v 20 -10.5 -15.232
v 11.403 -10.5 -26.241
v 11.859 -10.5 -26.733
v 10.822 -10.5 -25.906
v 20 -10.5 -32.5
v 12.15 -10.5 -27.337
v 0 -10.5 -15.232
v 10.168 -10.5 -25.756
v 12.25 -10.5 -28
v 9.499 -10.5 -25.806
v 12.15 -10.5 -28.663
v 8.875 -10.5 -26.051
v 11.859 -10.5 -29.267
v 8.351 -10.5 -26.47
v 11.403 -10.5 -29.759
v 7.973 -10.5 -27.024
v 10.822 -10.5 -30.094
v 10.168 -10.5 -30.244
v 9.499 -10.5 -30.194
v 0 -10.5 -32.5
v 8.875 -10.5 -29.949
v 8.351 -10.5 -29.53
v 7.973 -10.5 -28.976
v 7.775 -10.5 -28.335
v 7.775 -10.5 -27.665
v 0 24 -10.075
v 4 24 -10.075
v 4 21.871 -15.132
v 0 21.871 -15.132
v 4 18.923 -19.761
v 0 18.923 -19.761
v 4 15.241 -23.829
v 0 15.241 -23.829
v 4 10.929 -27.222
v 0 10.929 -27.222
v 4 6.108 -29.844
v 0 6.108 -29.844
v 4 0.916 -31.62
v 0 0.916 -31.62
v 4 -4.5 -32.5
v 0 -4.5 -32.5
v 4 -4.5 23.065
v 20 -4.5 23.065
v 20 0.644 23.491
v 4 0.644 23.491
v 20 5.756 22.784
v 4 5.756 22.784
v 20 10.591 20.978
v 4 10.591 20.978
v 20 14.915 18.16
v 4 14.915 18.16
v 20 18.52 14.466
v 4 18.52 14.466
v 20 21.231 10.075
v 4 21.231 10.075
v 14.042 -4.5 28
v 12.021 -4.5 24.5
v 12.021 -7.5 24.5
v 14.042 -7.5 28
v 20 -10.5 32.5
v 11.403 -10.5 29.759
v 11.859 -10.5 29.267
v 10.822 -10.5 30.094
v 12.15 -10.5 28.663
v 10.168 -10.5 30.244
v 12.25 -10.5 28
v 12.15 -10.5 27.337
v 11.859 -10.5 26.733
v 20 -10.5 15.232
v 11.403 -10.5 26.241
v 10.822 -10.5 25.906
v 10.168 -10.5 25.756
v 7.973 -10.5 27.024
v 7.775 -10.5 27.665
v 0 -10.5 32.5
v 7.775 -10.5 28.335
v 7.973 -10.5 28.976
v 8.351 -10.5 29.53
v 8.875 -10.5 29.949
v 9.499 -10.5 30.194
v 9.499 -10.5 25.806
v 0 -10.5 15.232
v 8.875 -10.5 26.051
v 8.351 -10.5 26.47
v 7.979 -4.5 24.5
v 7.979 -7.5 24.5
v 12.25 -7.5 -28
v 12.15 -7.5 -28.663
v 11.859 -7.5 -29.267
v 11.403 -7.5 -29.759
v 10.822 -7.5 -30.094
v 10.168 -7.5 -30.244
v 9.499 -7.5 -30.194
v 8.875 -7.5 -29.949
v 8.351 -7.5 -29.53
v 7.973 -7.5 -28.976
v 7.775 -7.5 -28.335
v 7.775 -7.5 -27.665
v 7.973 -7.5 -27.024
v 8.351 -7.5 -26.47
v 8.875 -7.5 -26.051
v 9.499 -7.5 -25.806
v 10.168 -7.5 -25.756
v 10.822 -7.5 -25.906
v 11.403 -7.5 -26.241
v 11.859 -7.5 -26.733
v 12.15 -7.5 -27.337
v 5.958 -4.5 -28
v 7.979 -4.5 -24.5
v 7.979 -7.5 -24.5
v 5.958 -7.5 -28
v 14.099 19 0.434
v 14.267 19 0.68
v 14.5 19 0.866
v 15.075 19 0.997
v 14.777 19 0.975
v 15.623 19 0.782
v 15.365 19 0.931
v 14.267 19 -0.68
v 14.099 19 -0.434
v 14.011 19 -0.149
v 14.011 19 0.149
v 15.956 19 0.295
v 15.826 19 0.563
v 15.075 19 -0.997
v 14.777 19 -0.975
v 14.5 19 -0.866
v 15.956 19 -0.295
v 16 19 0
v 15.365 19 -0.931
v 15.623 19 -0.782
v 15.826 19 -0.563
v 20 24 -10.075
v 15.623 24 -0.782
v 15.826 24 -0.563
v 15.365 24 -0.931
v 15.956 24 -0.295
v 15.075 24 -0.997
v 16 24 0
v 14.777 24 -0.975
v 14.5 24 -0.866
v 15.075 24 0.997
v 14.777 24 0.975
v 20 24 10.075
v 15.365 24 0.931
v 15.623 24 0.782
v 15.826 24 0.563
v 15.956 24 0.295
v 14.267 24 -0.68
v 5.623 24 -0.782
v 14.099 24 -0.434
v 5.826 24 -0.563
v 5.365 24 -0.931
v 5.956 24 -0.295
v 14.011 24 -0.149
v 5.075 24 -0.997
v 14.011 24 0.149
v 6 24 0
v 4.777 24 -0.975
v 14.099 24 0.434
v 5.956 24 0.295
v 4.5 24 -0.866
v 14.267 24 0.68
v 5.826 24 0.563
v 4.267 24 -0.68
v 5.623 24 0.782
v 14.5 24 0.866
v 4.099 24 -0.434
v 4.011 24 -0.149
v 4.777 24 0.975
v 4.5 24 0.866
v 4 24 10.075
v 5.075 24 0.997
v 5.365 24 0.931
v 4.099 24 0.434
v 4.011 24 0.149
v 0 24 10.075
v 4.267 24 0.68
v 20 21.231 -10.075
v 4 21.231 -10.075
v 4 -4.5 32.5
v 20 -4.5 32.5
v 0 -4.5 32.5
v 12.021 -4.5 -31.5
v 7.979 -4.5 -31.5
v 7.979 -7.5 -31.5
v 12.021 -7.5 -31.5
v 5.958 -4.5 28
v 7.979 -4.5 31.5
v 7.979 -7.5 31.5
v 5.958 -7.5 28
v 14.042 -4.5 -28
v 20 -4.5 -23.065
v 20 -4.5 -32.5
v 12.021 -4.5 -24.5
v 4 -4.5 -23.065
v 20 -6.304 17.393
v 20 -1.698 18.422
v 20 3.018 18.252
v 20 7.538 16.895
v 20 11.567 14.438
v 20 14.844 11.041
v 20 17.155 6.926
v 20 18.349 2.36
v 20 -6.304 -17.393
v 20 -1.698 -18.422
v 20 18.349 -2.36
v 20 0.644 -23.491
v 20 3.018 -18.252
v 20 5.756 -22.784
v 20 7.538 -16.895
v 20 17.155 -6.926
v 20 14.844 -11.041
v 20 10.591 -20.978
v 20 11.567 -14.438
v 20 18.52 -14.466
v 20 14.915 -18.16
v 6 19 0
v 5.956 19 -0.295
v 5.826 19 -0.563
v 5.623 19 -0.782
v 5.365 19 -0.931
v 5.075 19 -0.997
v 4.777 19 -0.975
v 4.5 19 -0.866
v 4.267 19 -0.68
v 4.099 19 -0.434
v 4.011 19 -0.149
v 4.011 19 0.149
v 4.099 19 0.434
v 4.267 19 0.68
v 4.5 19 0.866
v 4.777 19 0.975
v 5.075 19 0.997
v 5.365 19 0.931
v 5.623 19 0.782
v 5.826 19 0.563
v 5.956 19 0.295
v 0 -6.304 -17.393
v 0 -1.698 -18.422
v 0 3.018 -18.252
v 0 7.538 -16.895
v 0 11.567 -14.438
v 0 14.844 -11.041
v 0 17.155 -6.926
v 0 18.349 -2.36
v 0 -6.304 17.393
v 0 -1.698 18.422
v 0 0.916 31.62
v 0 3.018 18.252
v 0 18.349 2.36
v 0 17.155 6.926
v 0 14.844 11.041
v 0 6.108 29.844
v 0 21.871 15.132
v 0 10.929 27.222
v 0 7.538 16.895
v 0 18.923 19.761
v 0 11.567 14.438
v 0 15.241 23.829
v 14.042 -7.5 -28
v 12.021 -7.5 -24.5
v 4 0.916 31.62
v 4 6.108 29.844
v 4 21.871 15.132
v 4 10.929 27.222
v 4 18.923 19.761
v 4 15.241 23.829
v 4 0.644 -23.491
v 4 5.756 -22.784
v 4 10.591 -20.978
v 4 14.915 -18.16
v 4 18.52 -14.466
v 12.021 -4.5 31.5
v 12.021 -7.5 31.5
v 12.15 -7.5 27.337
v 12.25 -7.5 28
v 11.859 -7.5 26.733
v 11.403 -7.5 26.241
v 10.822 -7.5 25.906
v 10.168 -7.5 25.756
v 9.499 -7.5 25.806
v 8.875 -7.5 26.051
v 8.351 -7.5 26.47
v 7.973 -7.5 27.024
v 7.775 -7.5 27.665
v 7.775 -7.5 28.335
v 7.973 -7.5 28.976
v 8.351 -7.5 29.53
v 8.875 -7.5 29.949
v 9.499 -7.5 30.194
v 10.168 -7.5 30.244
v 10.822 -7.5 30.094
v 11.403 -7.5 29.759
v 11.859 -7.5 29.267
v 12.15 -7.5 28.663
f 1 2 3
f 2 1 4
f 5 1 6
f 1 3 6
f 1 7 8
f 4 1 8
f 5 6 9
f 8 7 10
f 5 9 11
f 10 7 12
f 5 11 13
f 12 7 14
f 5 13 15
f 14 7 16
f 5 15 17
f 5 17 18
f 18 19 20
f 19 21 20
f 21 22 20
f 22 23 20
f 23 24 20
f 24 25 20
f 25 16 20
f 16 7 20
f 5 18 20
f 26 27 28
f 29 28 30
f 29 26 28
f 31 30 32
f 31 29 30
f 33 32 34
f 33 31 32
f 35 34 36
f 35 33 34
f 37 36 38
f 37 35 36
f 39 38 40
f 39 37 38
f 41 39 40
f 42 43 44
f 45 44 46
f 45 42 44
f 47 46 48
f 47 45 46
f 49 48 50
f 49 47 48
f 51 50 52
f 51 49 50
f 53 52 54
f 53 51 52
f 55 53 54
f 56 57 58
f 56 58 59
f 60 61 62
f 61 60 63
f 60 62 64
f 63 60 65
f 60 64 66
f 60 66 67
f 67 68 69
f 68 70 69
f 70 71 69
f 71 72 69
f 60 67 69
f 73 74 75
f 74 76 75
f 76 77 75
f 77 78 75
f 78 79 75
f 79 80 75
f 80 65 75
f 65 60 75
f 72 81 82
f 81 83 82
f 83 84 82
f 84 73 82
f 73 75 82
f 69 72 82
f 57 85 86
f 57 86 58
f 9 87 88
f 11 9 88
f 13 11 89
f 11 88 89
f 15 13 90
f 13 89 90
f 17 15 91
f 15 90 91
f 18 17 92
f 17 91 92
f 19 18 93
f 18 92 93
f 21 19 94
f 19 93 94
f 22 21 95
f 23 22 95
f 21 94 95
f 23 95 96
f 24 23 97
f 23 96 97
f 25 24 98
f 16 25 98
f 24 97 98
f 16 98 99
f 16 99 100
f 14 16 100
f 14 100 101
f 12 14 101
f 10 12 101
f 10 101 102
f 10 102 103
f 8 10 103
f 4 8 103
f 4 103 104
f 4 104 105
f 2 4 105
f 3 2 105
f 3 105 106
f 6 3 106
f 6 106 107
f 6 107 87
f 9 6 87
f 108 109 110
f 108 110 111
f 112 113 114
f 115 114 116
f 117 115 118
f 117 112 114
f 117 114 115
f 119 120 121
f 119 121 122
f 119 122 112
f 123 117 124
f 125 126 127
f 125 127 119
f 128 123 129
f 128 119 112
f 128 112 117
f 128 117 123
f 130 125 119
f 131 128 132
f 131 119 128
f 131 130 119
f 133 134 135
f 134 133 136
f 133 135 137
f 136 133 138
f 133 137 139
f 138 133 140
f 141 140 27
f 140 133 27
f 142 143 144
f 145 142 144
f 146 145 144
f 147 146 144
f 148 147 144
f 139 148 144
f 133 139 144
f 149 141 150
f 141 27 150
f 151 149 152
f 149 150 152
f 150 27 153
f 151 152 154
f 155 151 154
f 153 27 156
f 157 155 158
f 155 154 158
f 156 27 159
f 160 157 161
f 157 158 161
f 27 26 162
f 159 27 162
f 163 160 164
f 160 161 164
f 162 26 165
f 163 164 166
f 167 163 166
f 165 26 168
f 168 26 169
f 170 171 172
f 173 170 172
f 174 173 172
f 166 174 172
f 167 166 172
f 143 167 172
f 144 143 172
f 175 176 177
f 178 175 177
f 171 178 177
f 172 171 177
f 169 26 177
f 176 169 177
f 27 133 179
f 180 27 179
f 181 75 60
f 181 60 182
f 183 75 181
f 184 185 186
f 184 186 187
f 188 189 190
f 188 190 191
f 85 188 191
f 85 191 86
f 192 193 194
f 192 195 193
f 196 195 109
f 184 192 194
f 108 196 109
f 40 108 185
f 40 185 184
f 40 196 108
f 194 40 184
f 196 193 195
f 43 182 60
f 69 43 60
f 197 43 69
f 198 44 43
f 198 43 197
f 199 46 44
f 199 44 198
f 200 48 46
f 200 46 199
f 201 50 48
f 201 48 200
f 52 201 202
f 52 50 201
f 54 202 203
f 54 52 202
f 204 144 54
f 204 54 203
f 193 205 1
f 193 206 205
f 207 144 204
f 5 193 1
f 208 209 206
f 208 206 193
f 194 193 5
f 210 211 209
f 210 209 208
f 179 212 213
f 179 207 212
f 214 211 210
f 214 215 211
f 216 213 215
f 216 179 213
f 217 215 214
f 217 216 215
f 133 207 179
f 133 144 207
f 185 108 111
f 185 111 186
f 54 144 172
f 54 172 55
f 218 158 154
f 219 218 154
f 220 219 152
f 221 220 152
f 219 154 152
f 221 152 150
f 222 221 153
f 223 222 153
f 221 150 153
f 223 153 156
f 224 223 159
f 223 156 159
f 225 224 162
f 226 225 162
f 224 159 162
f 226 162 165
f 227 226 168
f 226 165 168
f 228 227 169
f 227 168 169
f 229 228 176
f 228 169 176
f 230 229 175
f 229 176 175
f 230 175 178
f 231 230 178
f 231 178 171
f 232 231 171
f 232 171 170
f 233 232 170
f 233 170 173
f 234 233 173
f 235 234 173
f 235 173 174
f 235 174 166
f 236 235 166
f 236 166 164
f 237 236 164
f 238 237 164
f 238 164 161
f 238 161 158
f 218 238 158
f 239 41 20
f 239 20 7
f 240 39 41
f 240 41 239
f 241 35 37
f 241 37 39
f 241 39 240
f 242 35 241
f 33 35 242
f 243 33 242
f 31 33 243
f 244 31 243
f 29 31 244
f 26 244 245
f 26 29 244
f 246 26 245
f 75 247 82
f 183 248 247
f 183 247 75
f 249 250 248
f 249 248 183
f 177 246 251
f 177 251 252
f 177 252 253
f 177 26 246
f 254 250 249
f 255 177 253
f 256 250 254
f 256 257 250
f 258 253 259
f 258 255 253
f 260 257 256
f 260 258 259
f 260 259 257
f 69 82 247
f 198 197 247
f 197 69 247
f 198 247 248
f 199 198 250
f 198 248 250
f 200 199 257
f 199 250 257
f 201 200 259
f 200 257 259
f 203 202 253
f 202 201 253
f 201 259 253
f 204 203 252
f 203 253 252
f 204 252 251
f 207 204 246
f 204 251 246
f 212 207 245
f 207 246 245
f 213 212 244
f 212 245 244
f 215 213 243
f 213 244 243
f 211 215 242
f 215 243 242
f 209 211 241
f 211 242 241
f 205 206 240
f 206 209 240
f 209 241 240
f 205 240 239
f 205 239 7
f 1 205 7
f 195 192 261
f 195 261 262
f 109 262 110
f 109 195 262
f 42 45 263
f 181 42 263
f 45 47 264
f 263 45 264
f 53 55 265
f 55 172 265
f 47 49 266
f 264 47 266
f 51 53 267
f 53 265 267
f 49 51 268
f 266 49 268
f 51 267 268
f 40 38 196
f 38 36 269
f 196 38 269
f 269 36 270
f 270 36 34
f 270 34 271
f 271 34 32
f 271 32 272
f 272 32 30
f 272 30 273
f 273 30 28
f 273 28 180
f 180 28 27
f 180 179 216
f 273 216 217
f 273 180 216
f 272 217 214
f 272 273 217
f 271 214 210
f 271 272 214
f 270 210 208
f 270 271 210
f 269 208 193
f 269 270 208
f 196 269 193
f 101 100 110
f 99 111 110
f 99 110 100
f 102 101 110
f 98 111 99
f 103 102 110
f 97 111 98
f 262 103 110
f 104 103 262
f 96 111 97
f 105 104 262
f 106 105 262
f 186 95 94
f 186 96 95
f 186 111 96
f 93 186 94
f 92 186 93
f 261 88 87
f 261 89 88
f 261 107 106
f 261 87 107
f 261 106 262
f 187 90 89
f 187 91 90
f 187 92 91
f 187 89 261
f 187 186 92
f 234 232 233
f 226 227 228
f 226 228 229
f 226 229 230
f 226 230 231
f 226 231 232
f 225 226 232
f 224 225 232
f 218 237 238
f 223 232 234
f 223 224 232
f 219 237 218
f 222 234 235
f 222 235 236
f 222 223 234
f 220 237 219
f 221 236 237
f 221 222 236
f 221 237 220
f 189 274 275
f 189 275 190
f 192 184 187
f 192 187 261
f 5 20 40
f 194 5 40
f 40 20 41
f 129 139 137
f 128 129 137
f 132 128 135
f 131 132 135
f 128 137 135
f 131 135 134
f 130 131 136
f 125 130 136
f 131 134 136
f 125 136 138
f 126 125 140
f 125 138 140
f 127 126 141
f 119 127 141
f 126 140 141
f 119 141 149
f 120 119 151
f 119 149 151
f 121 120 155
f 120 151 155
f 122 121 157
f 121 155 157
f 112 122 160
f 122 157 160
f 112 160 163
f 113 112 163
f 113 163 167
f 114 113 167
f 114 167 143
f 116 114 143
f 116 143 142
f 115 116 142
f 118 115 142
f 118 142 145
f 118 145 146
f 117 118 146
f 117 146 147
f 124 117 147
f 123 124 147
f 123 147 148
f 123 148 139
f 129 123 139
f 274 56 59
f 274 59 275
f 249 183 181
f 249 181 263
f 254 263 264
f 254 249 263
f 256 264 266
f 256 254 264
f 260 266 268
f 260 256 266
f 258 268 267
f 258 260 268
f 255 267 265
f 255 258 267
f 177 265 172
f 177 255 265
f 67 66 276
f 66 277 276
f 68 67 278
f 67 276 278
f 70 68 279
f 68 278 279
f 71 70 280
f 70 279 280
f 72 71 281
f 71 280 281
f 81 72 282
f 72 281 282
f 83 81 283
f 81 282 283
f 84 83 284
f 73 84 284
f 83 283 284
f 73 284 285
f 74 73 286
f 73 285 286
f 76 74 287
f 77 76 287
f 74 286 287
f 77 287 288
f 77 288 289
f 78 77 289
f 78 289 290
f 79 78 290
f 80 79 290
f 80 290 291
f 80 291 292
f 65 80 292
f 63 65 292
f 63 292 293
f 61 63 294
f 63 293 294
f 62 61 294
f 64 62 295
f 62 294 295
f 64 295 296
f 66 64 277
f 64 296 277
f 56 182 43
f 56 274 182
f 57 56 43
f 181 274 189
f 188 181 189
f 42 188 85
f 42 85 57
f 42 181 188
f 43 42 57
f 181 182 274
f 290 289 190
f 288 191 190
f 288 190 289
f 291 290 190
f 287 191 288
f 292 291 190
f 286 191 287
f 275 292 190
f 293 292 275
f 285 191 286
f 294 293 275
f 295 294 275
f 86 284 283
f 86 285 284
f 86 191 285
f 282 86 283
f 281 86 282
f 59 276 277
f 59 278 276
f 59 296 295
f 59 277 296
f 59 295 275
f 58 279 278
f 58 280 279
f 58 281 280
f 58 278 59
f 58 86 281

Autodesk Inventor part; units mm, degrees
ref_plane "YZ Plane" through (0, 0, 0) normal (1, 0, 0) x (0, 1, 0)
ref_plane "XZ Plane" through (0, 0, 0) normal (0, 1, 0) x (-1, 0, 0)
ref_plane "XY Plane" through (0, 0, 0) normal (0, 0, 1) x (1, 0, 0)
sketch "Эскиз1" plane through (0, 0, 0) normal (1, 0, 0) x (0, 1, 0)
  arc A0 (-10.5, -15.2315) -> (-10.5, 15.2315) centre (0, 0) ccw
  line L0 (-18.5, 7.8305) -> (-18.5, -11.8621) construction
  line L1 (-22.5, 35.5109) -> (-22.5, -35.1928) construction
  line L2 (-10.5, 32.5) -> (-10.5, 15.2315)
  line L3 (-4.5, 32.5) -> (-4.5, 23.0651)
  line L4 (-10.5, 32.5) -> (-4.5, 32.5)
  line L5 (-10.5, -32.5) -> (-4.5, -32.5)
  line L6 (0, 0) -> (-8, 0) construction
  arc A1 (-4.5, -23.0651) -> (-4.5, 23.0651) centre (0, 0) ccw
  line L7 (-10.5, -15.2315) -> (-10.5, -32.5)
  line L8 (-4.5, -23.0651) -> (-4.5, -32.5)
  dimension "d0" = 37
  dimension "d2" = 4
  dimension "d3" = 12
  dimension "d4" = 6
  dimension "d5" = 65
  dimension "d6" = 5
extrude "Выдавливание1" add sketch "Эскиз1" along normal blind 20
sketch "Эскиз2" plane through (0, -4.5, 32.5) normal (0, 1, 0) x (1, 0, 0)
  line L0 (10, -4.2749) -> (10, 72.1744) construction
  line L1 (7.9793, 1) -> (5.9585, 4.5)
  line L2 (5.9585, 4.5) -> (7.9793, 8)
  line L3 (7.9793, 8) -> (12.0207, 8)
  line L4 (12.0207, 8) -> (14.0415, 4.5)
  line L5 (14.0415, 4.5) -> (12.0207, 1)
  line L6 (12.0207, 1) -> (7.9793, 1)
  line L7 (12.0207, 64) -> (14.0415, 60.5)
  line L8 (14.0415, 60.5) -> (12.0207, 57)
  line L9 (12.0207, 57) -> (7.9793, 57)
  line L10 (7.9793, 57) -> (5.9585, 60.5)
  line L11 (5.9585, 60.5) -> (7.9793, 64)
  line L12 (7.9793, 64) -> (12.0207, 64)
  line L13 (0, 32.5) -> (-8.5856, 32.5) construction
  line L14 (0, 65) -> (0, 55.5651) projected
  circle A0 centre (10, 4.5) radius 2.25
  circle A1 centre (10, 60.5) radius 2.25
  point P0 (10, 1)
  point P1 (10, 64)
  dimension "d9" = 7
  dimension "d10" = 56
  dimension "d11" = 10
  dimension "d12" = 4.5
  dimension "d13" = 4.5
extrude "Выдавливание2" cut sketch "Эскиз2" against normal blind 3
sketch "Эскиз3" plane through (10, -4.5, 28) normal (0, 1, 0) x (1, 0, 0)
  circle A0 centre (0, 0) radius 2.25 projected
  circle A1 centre (0, 56) radius 2.25 projected
  point P0 (-10, 28)
extrude "Выдавливание3" cut sketch "Эскиз3" against normal through all
sketch "Эскиз4" plane through (0, 0, 0) normal (-1, 0, 0) x (0, 0, 1)
  line L0 (-32.5, -10.5) -> (-32.5, -4.5) projected
  line L1 (-32.5, -10.5) -> (-32.5, -9.5)
  line L2 (-32.5, -4.5) -> (-23, -4.5)
  line L3 (32.5, -10.5) -> (15.2315, -10.5) projected
  line L4 (32.5, -10.5) -> (32.5, -4.5)
  line L5 (32.5, -4.5) -> (23, -4.5)
  arc A0 (23.0651, -4.5) -> (-23.0651, -4.5) centre (0, 0) ccw
  arc A1 (32.4076, -10.5) -> (32.5, -9.5) centre (0, -7) ccw
  line L6 (-10.0747, 24) -> (10.0747, 24)
  arc A2 (32.5, -4.5) -> (10.0747, 24) centre (0, -7) ccw
  arc A3 (-10.0747, 24) -> (-32.5, -4.5) centre (0, -7) ccw
extrude "Выдавливание12" add sketch "Эскиз4" against normal blind 4 contours A3 L6 A2 L5 A0 L2
sketch "Эскиз11" plane through (4, 0, 0) normal (1, 0, 0) x (0, 0, -1)
  line L0 (10.0747, 24) -> (-10.0747, 24) projected
  line L1 (10.0747, 24) -> (-10.0747, 24)
  line L2 (-10.0747, 24) -> (-10.0747, 21)
  arc A0 (32.5, -4.5) -> (10.0747, 24) centre (0, -7) ccw projected
  line L3 (10.0747, 24) -> (10.0747, 21.2309)
  arc A1 (23.0651, -4.5) -> (-23.0651, -4.5) centre (0, 0) ccw projected
  arc A2 (10.0747, 21.2309) -> (-10.0747, 21.2309) centre (0, 0) ccw
extrude "Выдавливание13" add sketch "Эскиз11" along normal blind 16
sketch "Эскиз12" plane through (0, 24, 10.0747) normal (0, 1, 0) x (1, 0, 0)
  circle A0 centre (15, 10.0747) radius 1
  circle A1 centre (5, 10.0747) radius 1
  point P0 (0, 10.0747)
  dimension "d49" = 2
extrude "Выдавливание14" cut sketch "Эскиз12" against normal blind 5
properties part number "05-01-Кронштейн верх (update)"
